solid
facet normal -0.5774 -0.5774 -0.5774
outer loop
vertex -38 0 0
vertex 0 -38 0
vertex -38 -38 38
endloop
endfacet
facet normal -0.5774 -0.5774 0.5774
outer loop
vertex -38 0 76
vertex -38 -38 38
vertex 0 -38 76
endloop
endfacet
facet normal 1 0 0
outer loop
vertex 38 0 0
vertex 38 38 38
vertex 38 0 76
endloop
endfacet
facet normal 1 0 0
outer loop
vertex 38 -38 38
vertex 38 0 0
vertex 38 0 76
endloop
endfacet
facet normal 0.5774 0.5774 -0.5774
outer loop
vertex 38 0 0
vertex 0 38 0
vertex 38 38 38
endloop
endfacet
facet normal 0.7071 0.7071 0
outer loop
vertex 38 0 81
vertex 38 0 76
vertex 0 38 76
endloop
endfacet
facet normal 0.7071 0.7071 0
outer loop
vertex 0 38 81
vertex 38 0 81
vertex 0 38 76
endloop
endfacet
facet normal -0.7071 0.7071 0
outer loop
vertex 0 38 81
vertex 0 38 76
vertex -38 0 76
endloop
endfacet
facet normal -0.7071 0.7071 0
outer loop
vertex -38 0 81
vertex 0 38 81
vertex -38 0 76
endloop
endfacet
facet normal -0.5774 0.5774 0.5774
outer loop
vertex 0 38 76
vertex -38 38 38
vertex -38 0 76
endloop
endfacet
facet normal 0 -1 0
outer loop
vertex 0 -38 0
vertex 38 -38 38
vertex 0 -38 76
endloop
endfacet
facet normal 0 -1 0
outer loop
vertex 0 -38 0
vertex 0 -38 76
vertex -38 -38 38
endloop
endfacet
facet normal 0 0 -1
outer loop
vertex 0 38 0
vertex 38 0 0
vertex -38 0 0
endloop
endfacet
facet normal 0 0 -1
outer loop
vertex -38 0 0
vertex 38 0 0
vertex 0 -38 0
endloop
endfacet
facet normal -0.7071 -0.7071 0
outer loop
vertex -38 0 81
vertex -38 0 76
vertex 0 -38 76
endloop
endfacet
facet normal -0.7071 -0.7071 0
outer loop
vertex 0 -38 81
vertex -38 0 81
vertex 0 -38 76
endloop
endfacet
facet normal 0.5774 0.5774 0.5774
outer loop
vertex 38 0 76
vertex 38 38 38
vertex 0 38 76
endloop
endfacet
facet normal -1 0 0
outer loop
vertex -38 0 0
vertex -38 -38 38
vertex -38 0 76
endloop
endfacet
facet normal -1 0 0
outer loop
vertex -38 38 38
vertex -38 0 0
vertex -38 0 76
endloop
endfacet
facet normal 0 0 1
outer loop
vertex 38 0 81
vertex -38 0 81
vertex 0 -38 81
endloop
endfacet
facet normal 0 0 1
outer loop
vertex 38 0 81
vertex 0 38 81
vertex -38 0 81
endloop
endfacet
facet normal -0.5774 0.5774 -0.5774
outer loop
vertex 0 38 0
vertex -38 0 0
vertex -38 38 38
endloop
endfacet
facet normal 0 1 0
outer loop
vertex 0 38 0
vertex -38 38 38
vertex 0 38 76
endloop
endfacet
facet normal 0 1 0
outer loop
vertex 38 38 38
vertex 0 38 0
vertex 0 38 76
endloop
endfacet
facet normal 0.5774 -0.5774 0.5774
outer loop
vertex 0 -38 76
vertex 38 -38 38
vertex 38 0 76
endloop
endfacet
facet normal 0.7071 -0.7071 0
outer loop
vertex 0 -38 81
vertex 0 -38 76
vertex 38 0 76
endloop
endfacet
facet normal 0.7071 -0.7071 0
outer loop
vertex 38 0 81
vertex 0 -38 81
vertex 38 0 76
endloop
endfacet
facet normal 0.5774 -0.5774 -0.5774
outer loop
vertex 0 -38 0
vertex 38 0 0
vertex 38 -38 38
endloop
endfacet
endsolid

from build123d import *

# Parameters (mm, degrees)
F0_W     = 38
F0_H     = 38
F1_DEPTH = 76
F5_COUNT = 4
F8_DEPTH = 5


with BuildPart() as f1:
    # F0 (on Top) → F1 (new body)
    with BuildSketch(Plane.XY):
        with Locations((-19, 19)):
            Rectangle(F0_W, F0_H)
    extrude(amount=F1_DEPTH)

    # F4: sweep along a path in F2
    with BuildLine(Plane.XY) as f4_path:
        Line((-76, -38), (0, 38))
    # F3 (on face) → F4 (sweep, cut)
    with BuildSketch(Plane(origin=(-38, 0, 0), x_dir=(0, -1, 0), z_dir=(-1, 0, 0))):
        Polygon((-38, 76), (-38, 38), (0, 76), align=None)
        Polygon((-38, 0), (0, 0), (-38, 38), align=None)
    sweep(path=f4_path.line, mode=Mode.SUBTRACT)


with BuildPart() as f5_1:
    # F5: instance of F1
    add(f1.part.rotate(Axis((0, 0, 38), (0, 0, 1)), 1 * 360 / F5_COUNT))


with BuildPart() as f5_2:
    # F5: instance of F1
    add(f1.part.rotate(Axis((0, 0, 38), (0, 0, 1)), 2 * 360 / F5_COUNT))


with BuildPart() as f5_3:
    # F5: instance of F1
    add(f1.part.rotate(Axis((0, 0, 38), (0, 0, 1)), 3 * 360 / F5_COUNT))


with BuildPart() as f5_1_1:
    add(f5_1.part)

    # F6: union F1, F5_3, F5_2
    add(f1.part)
    add(f5_3.part)
    add(f5_2.part)

    # F7 (on face) → F8 (join)
    with BuildSketch(Plane.XY.offset(76)):
        Polygon((-38, 0), (0, -38), (38, 0), (0, 38), align=None)
    extrude(amount=F8_DEPTH)


solid = f5_1_1.part
